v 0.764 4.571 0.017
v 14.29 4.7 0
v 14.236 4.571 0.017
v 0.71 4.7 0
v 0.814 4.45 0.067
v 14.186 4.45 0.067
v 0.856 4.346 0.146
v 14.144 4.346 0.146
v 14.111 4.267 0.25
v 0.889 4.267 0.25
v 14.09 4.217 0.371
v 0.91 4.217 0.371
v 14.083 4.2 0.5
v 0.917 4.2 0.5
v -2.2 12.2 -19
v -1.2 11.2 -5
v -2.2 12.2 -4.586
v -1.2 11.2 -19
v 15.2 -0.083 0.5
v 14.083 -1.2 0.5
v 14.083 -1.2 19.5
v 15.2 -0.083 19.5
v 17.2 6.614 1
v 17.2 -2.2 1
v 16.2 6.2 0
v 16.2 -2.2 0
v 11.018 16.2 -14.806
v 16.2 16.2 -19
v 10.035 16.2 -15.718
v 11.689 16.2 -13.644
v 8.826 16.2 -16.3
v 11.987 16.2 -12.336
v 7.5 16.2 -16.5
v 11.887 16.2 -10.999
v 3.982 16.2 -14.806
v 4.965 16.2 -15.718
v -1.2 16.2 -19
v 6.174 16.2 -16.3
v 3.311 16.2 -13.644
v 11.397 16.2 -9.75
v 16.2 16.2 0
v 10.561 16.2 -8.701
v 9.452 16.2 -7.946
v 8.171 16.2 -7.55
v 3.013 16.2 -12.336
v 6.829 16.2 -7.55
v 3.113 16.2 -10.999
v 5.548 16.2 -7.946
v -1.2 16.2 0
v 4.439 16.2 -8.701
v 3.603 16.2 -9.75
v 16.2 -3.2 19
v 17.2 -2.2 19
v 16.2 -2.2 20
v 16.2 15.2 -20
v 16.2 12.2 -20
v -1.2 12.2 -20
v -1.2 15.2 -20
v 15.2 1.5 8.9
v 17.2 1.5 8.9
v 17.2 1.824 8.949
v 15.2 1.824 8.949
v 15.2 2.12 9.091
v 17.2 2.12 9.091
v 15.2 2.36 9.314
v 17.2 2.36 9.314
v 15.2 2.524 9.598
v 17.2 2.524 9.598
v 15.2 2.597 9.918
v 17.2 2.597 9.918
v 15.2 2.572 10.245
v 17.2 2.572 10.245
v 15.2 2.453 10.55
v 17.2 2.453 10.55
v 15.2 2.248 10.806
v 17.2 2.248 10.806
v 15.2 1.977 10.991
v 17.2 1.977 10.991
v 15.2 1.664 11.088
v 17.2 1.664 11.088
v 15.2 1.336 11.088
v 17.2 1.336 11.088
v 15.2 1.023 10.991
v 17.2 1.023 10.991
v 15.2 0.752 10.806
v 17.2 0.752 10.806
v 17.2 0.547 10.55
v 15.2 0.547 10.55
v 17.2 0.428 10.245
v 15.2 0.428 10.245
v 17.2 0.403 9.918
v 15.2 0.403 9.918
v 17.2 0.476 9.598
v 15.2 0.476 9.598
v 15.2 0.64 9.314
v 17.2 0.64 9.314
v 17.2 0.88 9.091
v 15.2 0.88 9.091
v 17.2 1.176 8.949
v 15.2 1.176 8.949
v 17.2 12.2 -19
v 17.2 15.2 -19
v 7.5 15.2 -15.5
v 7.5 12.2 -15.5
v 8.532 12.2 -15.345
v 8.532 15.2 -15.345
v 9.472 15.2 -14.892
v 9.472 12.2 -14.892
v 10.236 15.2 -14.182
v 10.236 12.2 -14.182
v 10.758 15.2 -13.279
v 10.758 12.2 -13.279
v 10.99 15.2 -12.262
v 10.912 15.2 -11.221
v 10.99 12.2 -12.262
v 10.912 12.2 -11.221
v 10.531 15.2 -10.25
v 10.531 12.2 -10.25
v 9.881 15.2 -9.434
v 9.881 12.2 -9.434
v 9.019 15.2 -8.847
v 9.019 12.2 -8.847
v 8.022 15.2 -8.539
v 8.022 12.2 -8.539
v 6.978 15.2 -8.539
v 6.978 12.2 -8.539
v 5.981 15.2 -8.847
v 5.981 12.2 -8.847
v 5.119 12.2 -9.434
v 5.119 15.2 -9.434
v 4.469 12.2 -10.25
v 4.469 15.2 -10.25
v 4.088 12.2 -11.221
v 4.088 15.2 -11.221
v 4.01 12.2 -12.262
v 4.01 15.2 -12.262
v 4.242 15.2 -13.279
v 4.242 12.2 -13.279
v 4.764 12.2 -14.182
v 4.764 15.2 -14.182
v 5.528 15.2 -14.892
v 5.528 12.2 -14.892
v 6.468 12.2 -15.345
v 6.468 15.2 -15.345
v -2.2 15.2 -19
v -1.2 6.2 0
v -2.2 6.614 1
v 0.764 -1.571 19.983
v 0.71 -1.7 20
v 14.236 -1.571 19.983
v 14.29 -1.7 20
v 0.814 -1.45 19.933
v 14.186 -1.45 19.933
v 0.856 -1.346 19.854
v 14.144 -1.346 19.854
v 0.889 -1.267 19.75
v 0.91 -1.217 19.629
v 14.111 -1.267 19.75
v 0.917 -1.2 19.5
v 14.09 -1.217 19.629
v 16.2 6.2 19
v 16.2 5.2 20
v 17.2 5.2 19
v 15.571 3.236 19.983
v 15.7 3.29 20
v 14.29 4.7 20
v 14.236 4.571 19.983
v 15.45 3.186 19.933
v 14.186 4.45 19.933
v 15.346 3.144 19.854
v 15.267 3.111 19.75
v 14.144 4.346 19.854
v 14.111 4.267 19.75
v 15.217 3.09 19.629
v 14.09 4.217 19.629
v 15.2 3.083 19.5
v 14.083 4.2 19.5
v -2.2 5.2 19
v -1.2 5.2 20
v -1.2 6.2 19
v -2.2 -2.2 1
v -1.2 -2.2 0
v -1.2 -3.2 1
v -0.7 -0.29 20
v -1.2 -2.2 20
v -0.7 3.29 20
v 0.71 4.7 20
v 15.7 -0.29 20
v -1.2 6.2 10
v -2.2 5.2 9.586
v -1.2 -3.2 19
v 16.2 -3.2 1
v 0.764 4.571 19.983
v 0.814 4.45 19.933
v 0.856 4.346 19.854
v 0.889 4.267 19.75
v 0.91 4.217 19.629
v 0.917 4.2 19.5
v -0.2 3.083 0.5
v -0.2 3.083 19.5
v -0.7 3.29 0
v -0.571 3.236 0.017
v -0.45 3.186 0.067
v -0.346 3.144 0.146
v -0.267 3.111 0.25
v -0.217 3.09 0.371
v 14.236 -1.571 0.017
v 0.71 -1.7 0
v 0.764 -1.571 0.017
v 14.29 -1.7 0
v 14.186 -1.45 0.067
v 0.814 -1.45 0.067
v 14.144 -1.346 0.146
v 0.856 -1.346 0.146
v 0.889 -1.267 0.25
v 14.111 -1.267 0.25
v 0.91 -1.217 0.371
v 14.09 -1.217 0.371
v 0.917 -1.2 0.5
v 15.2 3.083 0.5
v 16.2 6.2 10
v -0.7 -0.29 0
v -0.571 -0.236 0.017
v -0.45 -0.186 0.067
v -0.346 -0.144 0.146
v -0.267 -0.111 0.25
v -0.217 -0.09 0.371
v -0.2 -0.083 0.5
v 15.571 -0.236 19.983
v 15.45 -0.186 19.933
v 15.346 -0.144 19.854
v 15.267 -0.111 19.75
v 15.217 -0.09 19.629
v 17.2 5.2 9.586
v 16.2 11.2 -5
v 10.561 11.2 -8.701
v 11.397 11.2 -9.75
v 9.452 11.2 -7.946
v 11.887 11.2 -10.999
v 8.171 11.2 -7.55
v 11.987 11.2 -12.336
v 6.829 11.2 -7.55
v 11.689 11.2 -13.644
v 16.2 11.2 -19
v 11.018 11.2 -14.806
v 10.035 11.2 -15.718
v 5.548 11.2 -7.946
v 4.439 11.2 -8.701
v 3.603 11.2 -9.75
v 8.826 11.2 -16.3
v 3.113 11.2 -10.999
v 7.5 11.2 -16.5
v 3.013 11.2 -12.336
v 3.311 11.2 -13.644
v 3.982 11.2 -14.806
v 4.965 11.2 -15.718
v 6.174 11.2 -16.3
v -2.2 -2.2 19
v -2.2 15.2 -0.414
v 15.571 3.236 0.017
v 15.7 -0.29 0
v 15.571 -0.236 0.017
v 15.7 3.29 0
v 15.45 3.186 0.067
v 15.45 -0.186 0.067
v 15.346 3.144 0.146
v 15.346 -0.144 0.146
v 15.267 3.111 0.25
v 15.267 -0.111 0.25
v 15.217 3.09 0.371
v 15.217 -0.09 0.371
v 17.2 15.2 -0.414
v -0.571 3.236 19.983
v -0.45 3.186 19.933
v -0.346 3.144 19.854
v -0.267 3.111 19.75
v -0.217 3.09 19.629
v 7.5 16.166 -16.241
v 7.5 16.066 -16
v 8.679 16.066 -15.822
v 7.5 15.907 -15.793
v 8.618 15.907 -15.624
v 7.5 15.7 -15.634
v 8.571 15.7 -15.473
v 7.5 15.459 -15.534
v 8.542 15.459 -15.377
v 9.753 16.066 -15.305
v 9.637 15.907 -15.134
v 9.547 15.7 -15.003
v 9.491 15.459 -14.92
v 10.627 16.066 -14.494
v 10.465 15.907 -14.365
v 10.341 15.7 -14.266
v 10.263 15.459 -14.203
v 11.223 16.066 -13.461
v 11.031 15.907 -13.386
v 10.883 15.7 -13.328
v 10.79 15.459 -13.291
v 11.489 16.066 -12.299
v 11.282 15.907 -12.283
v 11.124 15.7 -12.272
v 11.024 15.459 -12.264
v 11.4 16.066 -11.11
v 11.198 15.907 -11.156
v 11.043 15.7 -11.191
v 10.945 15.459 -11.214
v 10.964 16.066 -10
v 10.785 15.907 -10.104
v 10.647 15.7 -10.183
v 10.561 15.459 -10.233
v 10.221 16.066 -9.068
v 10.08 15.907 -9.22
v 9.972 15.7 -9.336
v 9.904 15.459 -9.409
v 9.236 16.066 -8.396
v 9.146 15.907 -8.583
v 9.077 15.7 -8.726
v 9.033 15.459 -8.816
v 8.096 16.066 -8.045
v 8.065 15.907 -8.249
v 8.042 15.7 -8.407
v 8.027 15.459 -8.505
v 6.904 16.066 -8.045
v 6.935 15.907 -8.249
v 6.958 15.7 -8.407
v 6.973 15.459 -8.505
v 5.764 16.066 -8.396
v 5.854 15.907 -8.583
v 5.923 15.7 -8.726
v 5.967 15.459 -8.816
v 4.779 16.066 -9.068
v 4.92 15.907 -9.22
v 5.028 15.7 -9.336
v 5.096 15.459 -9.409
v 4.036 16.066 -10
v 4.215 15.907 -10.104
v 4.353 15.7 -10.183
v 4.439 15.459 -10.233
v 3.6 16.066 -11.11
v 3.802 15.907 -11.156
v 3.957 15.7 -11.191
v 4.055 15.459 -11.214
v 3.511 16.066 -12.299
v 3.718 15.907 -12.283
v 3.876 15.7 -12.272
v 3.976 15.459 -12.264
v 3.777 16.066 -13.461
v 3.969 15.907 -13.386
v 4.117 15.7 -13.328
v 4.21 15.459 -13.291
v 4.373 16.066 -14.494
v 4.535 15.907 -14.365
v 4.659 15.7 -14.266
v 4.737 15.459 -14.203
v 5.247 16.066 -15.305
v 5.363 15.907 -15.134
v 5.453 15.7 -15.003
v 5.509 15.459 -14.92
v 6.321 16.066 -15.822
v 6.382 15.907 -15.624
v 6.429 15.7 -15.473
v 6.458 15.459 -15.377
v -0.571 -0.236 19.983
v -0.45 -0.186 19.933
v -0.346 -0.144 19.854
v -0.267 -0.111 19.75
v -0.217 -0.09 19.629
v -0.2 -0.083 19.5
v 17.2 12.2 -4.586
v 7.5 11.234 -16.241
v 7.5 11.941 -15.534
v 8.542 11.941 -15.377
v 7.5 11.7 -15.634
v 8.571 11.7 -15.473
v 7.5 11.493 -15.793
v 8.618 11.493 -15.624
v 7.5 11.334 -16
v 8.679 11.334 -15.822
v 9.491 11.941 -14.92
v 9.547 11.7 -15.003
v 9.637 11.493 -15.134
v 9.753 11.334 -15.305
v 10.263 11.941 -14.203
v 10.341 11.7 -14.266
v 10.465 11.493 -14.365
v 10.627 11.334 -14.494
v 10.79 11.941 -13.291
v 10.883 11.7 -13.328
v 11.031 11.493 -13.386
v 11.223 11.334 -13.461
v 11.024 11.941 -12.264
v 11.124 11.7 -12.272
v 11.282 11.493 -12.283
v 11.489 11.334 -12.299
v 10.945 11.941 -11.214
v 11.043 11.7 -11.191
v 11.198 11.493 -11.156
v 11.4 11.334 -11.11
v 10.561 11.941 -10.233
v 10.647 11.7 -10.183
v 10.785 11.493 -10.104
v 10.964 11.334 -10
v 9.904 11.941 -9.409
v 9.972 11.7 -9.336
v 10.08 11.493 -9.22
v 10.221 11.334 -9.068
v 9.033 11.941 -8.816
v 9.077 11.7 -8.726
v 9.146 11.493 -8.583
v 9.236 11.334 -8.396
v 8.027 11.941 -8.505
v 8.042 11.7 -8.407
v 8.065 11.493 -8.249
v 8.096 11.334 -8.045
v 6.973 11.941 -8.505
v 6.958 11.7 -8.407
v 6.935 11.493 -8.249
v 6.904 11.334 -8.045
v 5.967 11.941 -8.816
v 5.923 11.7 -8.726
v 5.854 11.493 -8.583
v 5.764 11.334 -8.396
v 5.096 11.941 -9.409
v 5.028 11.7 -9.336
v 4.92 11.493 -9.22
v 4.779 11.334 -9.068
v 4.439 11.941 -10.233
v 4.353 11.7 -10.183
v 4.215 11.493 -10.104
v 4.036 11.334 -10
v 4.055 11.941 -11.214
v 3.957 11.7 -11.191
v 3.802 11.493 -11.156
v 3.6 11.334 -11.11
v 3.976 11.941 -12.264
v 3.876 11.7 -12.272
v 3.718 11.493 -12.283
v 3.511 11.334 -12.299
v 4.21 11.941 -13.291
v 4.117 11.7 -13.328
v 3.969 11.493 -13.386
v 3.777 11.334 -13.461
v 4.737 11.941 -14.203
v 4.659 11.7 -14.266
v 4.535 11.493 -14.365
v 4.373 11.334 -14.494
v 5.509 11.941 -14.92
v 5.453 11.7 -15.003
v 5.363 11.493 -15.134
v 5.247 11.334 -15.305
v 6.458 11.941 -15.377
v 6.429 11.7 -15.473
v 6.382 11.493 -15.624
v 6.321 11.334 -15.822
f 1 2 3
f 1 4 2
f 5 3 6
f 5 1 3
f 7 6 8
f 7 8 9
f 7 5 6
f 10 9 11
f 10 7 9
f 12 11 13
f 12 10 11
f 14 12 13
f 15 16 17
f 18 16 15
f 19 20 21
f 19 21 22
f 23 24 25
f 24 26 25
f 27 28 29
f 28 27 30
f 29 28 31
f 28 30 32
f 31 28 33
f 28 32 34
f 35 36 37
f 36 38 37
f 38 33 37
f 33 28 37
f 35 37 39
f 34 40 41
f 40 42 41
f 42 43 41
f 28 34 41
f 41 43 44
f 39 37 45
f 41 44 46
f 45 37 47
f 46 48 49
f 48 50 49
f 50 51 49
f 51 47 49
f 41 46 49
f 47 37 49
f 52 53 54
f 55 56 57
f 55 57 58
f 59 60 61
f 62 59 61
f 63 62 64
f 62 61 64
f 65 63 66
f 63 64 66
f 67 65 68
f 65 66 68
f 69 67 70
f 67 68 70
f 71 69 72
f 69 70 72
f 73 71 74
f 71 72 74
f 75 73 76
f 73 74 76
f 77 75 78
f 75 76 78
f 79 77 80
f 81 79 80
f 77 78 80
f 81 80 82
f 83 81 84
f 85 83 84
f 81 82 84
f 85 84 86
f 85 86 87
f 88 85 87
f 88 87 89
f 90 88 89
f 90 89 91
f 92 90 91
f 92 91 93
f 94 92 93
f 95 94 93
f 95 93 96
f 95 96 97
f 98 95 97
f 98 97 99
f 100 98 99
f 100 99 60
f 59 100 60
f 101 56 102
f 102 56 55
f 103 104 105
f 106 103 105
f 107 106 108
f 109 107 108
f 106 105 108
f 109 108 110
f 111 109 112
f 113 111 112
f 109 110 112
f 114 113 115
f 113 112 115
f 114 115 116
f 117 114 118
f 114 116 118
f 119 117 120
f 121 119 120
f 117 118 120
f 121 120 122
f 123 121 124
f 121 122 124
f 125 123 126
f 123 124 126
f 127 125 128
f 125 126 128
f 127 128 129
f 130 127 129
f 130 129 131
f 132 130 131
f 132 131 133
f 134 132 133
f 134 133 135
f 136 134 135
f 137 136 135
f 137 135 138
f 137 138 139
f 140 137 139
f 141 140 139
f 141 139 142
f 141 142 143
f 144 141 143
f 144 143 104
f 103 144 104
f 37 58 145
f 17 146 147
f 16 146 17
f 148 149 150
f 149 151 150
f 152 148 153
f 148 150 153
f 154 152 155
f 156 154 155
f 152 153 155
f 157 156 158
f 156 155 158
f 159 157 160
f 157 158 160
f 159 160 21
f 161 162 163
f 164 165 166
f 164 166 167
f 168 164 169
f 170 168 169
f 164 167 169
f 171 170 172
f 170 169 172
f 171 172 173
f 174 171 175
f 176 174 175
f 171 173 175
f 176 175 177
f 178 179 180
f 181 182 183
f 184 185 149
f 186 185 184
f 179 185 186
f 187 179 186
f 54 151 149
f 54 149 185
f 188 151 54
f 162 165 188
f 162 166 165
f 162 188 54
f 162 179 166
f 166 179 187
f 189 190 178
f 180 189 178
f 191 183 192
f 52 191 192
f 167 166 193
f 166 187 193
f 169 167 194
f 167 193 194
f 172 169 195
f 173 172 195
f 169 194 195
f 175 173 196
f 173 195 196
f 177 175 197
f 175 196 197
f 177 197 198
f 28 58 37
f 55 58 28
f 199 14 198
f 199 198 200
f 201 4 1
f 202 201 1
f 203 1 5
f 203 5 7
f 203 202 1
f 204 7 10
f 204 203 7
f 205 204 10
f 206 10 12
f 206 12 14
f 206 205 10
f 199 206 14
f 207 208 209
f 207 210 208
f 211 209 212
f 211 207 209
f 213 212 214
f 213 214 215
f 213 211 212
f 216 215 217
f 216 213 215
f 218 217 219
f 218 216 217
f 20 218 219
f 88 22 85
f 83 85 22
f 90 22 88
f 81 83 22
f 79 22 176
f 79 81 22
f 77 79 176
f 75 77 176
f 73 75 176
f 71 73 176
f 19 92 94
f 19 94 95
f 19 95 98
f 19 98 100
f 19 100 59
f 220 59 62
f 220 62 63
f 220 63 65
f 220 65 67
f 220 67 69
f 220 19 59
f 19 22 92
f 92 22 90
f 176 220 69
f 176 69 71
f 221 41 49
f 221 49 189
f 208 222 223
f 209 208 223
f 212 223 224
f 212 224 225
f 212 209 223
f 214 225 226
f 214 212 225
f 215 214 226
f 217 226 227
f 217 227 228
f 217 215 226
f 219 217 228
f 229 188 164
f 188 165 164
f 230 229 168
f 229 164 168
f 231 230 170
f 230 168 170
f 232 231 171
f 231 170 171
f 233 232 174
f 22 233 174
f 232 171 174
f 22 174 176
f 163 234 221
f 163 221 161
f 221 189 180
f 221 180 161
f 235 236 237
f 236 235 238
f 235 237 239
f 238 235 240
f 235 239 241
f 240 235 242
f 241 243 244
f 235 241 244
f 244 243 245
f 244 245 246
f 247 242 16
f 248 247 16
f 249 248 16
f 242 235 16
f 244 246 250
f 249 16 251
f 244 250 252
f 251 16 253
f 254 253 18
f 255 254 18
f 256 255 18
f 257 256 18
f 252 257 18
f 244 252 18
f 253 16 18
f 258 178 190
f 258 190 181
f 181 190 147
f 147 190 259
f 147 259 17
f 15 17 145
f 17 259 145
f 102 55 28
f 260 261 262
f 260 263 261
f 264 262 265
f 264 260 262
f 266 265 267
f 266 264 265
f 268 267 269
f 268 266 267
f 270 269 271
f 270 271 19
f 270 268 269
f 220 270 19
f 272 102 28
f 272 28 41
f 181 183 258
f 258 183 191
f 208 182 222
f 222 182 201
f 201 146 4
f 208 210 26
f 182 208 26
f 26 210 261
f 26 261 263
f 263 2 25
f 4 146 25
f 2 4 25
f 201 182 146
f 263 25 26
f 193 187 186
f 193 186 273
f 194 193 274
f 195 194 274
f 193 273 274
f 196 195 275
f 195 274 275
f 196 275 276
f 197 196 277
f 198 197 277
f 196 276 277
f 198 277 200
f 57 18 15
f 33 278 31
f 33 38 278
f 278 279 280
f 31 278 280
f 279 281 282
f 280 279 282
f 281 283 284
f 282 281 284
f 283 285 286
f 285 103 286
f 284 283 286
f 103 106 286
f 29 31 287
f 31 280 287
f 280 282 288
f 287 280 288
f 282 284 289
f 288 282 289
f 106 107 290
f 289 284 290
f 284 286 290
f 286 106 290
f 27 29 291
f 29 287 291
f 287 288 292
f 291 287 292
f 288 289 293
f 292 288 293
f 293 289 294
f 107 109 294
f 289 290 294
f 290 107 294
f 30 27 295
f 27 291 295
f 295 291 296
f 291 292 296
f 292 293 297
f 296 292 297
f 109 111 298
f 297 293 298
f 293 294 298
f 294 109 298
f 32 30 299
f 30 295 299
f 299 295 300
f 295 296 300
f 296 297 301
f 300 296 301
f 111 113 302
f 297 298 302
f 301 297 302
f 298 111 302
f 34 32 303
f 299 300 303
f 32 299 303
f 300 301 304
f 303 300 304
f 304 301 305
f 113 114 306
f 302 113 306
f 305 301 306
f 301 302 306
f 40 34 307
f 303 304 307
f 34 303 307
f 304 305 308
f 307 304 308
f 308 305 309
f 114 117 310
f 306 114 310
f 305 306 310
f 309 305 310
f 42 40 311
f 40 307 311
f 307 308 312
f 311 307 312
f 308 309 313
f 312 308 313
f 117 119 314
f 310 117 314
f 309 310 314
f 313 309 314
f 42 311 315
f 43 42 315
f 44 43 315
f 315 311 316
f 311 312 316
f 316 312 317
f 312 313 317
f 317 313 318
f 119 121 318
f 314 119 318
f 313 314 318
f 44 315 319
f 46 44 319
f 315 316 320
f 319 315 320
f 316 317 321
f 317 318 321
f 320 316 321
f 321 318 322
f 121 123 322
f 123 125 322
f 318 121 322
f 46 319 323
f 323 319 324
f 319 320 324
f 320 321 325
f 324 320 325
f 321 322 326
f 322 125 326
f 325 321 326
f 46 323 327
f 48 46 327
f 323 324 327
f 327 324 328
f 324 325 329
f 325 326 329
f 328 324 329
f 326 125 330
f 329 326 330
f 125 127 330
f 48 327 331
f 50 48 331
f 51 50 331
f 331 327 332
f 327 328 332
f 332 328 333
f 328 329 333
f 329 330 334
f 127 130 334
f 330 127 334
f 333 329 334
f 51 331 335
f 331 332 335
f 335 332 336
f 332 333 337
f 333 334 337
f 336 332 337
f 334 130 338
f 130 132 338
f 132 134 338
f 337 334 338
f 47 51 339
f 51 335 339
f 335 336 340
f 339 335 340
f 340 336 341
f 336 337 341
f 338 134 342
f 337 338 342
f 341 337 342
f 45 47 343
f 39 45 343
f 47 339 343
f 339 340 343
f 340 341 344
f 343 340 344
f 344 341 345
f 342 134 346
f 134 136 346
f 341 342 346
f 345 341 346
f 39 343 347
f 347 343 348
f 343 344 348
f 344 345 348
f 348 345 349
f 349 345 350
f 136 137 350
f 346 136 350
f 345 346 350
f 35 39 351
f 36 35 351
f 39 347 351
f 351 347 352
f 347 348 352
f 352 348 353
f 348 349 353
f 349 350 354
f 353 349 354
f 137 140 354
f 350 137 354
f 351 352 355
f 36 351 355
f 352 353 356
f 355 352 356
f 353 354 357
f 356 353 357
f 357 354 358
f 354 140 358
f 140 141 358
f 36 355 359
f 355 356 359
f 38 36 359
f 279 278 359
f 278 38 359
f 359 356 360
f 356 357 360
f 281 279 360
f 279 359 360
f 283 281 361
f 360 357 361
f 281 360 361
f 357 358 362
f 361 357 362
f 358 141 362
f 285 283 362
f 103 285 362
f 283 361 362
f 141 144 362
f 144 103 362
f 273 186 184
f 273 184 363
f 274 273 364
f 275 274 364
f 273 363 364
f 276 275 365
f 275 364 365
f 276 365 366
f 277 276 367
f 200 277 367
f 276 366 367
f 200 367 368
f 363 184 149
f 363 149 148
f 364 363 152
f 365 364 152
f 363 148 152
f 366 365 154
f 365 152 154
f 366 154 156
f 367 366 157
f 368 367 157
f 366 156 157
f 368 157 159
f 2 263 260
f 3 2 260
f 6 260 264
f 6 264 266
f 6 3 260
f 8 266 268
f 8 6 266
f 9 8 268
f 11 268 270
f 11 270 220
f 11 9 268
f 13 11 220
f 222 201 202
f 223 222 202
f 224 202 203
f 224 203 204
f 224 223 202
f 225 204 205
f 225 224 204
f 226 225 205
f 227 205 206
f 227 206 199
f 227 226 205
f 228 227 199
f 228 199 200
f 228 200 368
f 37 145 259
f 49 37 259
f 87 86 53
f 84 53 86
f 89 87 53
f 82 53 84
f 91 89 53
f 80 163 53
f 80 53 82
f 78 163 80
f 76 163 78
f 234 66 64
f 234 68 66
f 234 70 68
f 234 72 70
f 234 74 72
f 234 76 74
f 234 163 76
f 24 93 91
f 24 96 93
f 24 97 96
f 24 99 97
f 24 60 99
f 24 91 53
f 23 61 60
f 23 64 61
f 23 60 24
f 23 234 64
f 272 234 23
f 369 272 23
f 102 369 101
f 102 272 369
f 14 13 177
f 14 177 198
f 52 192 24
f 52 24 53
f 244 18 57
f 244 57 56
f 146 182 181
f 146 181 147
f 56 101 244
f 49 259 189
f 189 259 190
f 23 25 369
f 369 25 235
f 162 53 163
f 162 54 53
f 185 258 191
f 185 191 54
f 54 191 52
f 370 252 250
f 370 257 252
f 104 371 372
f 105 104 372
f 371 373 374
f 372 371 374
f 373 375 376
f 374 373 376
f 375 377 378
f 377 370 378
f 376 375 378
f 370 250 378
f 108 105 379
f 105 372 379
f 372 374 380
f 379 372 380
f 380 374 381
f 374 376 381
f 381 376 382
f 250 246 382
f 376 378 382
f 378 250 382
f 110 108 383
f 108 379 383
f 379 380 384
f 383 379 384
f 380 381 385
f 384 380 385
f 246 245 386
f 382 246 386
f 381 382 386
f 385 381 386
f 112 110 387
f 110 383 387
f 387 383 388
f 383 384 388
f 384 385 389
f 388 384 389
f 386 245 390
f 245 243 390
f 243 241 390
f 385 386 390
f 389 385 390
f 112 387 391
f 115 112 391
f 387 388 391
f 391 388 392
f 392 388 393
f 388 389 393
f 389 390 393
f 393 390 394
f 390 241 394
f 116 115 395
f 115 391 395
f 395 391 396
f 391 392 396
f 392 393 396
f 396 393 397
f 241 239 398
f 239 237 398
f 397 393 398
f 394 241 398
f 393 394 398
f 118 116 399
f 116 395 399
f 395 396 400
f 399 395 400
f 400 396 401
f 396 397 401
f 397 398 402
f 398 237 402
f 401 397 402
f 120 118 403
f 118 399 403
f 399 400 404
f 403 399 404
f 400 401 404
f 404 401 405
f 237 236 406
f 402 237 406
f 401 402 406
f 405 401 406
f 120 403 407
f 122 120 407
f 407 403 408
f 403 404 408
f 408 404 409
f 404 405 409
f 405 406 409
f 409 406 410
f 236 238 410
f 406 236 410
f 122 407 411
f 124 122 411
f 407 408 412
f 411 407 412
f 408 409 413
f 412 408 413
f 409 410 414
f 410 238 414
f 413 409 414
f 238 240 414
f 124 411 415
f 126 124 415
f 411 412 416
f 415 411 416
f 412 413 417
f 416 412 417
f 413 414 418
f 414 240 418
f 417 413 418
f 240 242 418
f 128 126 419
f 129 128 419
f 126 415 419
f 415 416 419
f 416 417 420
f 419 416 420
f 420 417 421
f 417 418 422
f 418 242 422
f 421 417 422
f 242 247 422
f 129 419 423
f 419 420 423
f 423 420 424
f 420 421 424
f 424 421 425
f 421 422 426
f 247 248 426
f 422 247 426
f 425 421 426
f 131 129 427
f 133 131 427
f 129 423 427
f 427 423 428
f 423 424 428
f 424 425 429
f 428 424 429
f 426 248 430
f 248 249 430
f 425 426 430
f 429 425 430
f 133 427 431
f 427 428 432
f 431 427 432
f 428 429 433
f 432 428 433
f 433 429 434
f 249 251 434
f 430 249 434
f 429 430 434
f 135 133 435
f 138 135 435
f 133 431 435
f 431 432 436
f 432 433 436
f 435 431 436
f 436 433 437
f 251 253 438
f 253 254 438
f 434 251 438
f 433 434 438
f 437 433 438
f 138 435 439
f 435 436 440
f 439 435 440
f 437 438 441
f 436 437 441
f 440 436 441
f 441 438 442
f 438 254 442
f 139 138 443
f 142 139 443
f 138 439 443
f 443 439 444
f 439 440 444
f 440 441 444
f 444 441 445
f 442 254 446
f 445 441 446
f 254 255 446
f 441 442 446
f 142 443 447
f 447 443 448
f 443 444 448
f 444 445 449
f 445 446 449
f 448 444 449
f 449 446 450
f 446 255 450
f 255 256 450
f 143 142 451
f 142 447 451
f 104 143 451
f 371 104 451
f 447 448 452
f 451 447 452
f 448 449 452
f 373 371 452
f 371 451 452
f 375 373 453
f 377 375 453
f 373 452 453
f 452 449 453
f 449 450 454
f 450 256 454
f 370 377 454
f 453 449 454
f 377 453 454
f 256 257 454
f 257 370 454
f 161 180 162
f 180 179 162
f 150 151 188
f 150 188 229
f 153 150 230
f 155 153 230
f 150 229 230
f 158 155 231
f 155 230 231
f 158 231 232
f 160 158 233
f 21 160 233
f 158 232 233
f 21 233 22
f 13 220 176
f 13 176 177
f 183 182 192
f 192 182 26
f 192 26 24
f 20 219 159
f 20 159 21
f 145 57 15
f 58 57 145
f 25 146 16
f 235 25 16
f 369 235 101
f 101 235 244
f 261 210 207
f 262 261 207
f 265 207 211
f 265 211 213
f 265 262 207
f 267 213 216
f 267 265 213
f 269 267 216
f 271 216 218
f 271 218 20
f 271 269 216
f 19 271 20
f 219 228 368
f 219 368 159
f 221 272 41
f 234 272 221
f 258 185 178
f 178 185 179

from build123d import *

# Parameters (mm, degrees)
ESBO_O2_W                = 19.4
ESBO_O2_H                = 9.4
RESSALTO_EXTRUS_O1_DEPTH = 20
RESSALTO_EXTRUS_O2_DEPTH = 19.4
CHANFRO2_SIZE            = 1
ESBO_O5_R                = 3.5
CORTE_EXTRUS_O1_DEPTH    = 20
FILETE1_R                = 1
FILETE2_R                = 0.5
ESBO_O6_R                = 1.1
CORTE_EXTRUS_O2_DEPTH    = 10


with BuildPart() as part:
    # Esboço2 → Ressalto-extrusão1 (new body)
    with BuildSketch(Plane.XY):
        with Locations((7.5, 1.5)):
            Rectangle(ESBO_O2_W, ESBO_O2_H)
        Polygon((15.2, 3.082842712), (14.082842712, 4.2), (0.917157288, 4.2), (-0.2, 3.082842712), (-0.2, -0.082842712), (0.917157288, -1.2), (14.082842712, -1.2), (15.2, -0.082842712), align=None, mode=Mode.SUBTRACT)
    extrude(amount=RESSALTO_EXTRUS_O1_DEPTH)

    # Esboço4 → Ressalto-extrusão2 (add)
    with BuildSketch(Plane(origin=(-2.2, 0, 0), x_dir=(0, 0, -1), z_dir=(1, 0, 0))):
        Polygon((0, 16.2), (-10, 6.2), (0, 6.2), (5, 11.2), (20, 11.2), (20, 16.2), align=None)
    extrude(amount=RESSALTO_EXTRUS_O2_DEPTH)

    # Chanfro2
    chanfro2_edges = [part.edges().sort_by_distance(p)[0] for p in [
        (17.2, 1.5, 20),
        (7.5, 6.2, 20),
        (17.2, 11.2, 5),
        (-2.2, 11.2, 5),
        (17.2, 8.7, -2.5),
        (-2.2, 8.7, -2.5),
        (17.2, 11.2, -12.5),
        (-2.2, 11.2, -12.5),
        (17.2, 13.7, -20),
        (7.5, 11.2, -20),
        (-2.2, 13.7, -20),
        (7.5, 16.2, -20),
        (-2.2, 16.2, -10),
        (17.2, 16.2, -10),
        (-2.2, 1.5, 20),
        (17.2, 1.5, 0),
        (7.5, -3.2, 0),
        (-2.2, 1.5, 0),
        (-2.2, 6.2, 15),
        (17.2, 6.2, 15),
        (17.2, -3.2, 10),
        (-2.2, -3.2, 10),
        (7.5, -3.2, 20),
    ]]
    chamfer(chanfro2_edges, length=CHANFRO2_SIZE)

    # Esboço5 → Corte-extrusão1 (cut)
    with BuildSketch(Plane.XZ.offset(-11.2)):
        with Locations(Location((7.5, -12, 0), (0, 0, 270))):
            Circle(ESBO_O5_R)
    extrude(amount=-CORTE_EXTRUS_O1_DEPTH, mode=Mode.SUBTRACT)

    # Filete1
    filete1_edges = [part.edges().sort_by_distance(p)[0] for p in [
        (7.5, 16.2, -8.5),
        (7.5, 11.2, -8.5),
    ]]
    fillet(filete1_edges, radius=FILETE1_R)

    # Filete2
    filete2_edges = [part.edges().sort_by_distance(p)[0] for p in [
        (15.2, 1.5, 0),
        (14.641421356, 3.641421356, 0),
        (7.5, 4.2, 0),
        (0.358578644, 3.641421356, 0),
        (-0.2, 1.5, 0),
        (0.358578644, -0.641421356, 0),
        (7.5, -1.2, 0),
        (14.641421356, -0.641421356, 0),
        (15.2, 1.5, 20),
        (14.641421356, 3.641421356, 20),
        (7.5, 4.2, 20),
        (0.358578644, 3.641421356, 20),
        (-0.2, 1.5, 20),
        (0.358578644, -0.641421356, 20),
        (7.5, -1.2, 20),
        (14.641421356, -0.641421356, 20),
    ]]
    fillet(filete2_edges, radius=FILETE2_R)

    # Esboço6 → Corte-extrusão2 (cut)
    with BuildSketch(Plane(origin=(17.2, 0, 0), x_dir=(0, 0, -1), z_dir=(1, 0, 0))):
        with Locations((-10, 1.5)):
            Circle(ESBO_O6_R)
    extrude(amount=-CORTE_EXTRUS_O2_DEPTH, mode=Mode.SUBTRACT)


solid = part.part
